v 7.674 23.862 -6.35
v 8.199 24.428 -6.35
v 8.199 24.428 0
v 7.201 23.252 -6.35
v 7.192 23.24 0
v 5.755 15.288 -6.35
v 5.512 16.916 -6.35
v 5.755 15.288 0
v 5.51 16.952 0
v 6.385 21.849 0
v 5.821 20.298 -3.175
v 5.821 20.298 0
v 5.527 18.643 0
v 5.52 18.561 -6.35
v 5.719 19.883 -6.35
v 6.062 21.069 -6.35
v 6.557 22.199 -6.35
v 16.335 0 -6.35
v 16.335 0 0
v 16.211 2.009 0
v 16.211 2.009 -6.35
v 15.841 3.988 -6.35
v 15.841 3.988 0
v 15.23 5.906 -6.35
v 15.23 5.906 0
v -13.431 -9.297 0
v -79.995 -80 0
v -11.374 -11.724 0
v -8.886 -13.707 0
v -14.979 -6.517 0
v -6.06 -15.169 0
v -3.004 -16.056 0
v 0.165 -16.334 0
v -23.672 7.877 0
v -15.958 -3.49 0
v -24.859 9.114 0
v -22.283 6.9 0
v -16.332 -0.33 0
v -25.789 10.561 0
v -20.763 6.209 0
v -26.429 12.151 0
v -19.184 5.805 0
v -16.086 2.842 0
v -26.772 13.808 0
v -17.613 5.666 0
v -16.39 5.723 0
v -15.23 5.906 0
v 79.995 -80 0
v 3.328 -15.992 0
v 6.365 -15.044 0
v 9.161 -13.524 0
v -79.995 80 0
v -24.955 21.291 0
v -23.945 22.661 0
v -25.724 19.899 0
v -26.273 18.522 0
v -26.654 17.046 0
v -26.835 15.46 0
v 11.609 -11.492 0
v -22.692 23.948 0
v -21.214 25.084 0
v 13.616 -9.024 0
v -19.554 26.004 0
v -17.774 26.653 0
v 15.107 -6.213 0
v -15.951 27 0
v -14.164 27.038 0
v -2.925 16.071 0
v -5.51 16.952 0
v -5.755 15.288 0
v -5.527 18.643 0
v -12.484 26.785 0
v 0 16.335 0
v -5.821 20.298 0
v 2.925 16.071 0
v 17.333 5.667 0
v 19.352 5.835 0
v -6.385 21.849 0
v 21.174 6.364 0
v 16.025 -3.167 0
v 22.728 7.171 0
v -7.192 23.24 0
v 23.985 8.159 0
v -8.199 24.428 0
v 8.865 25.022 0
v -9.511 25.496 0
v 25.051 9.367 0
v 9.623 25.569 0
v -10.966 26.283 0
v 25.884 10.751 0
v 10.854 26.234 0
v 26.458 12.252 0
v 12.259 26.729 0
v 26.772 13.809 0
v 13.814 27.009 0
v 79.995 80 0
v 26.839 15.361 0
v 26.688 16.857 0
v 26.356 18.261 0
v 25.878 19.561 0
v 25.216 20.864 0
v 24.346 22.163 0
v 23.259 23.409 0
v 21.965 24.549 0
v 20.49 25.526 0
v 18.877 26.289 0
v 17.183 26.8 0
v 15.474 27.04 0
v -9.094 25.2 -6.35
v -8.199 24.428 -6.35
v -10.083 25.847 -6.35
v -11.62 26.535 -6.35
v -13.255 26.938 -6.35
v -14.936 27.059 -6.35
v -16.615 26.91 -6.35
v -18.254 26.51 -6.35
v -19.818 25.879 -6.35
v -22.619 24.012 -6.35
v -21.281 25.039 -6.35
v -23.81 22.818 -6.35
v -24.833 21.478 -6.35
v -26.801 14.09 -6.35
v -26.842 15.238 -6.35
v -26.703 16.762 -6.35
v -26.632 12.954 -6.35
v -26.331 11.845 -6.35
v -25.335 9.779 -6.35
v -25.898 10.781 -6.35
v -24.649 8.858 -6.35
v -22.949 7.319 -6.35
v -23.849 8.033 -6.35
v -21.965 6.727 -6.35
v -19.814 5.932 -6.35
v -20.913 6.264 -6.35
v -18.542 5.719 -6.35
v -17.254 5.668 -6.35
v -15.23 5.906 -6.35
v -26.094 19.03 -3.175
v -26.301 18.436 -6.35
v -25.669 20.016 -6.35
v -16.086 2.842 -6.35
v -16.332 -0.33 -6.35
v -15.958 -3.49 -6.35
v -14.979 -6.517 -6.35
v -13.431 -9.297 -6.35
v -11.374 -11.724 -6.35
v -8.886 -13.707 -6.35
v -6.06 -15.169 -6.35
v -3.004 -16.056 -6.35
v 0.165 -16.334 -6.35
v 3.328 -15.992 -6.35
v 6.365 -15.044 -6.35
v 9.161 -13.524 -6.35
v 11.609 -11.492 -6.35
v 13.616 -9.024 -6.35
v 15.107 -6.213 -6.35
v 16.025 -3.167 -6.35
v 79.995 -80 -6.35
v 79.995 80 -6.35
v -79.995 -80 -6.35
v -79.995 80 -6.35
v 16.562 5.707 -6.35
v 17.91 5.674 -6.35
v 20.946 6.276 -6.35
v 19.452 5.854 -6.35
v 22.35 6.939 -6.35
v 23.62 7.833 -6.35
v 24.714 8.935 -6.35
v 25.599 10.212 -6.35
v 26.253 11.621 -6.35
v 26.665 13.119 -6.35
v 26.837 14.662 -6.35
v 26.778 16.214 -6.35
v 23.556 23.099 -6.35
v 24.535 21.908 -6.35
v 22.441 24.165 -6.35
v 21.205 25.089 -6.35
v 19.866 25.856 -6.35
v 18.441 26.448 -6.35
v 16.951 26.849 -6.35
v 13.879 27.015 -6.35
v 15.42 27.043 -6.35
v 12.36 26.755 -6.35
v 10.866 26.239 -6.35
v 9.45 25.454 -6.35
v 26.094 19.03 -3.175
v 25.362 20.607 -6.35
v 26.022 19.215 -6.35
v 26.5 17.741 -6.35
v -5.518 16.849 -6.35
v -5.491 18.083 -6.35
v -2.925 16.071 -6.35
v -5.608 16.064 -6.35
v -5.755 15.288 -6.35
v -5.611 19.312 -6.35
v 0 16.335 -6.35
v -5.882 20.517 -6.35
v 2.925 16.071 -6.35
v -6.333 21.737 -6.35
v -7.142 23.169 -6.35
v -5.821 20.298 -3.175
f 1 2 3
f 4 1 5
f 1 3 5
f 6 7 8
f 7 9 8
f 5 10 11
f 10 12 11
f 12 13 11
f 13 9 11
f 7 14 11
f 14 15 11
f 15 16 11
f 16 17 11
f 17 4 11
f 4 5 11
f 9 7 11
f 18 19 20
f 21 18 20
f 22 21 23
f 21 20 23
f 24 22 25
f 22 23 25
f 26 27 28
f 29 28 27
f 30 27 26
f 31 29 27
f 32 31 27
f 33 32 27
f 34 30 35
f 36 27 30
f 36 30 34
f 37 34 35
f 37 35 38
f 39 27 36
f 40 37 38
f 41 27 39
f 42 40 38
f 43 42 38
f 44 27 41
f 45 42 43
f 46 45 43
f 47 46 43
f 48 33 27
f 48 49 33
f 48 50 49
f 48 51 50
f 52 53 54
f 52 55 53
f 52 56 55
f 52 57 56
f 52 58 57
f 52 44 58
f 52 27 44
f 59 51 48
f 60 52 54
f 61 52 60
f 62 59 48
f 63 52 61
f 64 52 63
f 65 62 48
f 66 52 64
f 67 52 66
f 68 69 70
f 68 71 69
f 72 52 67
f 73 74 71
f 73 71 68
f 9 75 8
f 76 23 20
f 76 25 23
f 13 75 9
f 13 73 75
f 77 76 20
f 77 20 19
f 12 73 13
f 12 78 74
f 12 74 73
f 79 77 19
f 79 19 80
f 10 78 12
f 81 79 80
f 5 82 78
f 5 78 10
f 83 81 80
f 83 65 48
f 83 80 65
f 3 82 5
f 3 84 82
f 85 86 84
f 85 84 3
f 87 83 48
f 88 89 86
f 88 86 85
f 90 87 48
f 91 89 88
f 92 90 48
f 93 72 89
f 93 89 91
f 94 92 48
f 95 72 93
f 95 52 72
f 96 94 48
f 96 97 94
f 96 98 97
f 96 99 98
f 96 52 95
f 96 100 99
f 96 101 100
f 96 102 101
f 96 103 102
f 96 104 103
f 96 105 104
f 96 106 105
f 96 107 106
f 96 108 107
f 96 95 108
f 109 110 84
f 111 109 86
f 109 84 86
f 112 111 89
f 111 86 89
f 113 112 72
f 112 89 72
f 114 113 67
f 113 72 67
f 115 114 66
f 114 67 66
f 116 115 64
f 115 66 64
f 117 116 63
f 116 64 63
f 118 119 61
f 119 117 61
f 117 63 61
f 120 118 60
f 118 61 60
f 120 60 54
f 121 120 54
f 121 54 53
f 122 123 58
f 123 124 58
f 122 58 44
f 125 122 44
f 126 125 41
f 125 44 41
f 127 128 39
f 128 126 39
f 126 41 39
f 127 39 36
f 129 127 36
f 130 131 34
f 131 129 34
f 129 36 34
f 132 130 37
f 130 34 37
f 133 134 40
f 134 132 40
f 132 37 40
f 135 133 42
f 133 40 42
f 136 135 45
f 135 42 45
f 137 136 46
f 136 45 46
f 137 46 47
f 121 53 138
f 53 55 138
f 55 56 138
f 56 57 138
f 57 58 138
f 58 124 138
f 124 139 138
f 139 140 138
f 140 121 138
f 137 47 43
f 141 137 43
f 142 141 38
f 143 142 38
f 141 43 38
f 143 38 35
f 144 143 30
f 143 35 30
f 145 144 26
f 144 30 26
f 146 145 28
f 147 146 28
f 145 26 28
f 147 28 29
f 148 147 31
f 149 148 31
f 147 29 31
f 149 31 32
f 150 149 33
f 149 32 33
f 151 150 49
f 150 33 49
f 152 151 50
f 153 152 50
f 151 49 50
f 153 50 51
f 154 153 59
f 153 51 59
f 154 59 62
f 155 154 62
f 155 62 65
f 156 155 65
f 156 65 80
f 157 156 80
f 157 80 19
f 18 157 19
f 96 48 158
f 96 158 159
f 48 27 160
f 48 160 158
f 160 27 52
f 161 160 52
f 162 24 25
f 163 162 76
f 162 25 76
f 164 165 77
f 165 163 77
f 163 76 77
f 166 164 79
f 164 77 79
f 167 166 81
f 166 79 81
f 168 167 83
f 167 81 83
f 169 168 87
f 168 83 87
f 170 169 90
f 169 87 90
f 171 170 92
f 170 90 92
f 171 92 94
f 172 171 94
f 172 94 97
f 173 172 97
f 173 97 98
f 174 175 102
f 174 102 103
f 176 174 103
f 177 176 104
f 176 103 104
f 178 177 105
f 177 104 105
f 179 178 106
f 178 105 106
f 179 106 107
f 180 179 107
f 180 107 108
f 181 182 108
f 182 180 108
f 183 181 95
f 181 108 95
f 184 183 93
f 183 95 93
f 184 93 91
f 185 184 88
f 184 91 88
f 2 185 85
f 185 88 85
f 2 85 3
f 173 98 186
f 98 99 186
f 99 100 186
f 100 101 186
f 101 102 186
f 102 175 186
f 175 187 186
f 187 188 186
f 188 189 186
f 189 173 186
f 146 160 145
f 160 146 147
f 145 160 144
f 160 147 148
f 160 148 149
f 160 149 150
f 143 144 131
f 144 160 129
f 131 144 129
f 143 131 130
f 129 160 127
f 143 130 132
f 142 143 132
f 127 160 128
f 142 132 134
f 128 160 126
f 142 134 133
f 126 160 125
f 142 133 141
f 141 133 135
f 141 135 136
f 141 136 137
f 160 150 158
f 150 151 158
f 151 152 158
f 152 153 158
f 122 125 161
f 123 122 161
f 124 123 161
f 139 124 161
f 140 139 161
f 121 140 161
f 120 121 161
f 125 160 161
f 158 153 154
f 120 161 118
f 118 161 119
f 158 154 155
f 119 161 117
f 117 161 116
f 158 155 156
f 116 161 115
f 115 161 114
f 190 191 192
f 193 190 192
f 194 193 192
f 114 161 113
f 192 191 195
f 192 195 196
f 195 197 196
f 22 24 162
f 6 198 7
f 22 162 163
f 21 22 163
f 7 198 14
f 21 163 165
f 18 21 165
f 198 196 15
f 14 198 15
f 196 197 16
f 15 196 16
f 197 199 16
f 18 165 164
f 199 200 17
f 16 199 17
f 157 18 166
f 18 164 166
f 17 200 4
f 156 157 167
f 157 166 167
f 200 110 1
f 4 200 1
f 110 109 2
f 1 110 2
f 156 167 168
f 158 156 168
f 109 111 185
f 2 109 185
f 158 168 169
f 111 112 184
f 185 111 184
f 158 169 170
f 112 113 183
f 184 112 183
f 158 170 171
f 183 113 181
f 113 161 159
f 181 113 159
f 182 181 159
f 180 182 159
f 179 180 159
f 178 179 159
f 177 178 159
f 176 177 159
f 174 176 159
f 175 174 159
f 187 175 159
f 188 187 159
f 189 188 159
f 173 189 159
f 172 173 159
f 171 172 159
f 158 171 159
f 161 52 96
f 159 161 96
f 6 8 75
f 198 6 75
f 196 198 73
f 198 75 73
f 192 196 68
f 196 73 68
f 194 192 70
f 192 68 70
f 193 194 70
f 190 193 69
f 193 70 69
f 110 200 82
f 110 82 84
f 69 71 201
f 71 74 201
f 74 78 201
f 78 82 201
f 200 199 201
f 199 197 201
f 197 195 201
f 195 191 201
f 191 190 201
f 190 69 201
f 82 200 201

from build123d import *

# Parameters (mm, degrees)
F0_W     = 159.9906936405
F0_H     = 160
F2_DEPTH = 6.35
F3_DEPTH = 6.351
F4_DEPTH = 25
F5_DEPTH = 25
F6_DEPTH = 25
F7_DEPTH = 25


with BuildPart() as f2:
    # F0 (on Top) → F2 (new body)
    with BuildSketch(Plane.XY):
        Rectangle(F0_W, F0_H)
    extrude(amount=-F2_DEPTH)

    # F1 (on face) → F3 (cut, through all)
    with BuildSketch(Plane.XY):
        with BuildLine():
            add(Edge.make_bspline(
                [(-8.1994745377, 24.4279390933), (-19.7248762604, 35.8088584368), (-26.0936386648, 19.0302092428), (-32.4624010693, 2.2515600487), (-15.2297855146, 5.9064251608)],
                knots=[0, 0, 0, 2.0353938469, 2.0353938469, 4.0707876938, 4.0707876938, 4.0707876938], degree=2, weights=[1, 0.5253270315, 1, 0.5253270315, 1]))
            ThreePointArc((-15.2297855146, 5.9064251608), (-11.4929489268, 11.6079433995), (-5.7545107942, 15.2878327607))
            add(Edge.make_bspline(
                [(-5.7545107942, 15.2878327607), (-4.5186333902, 20.7932409522), (-8.1994745377, 24.4279390933)],
                knots=[5.3284067292, 5.3284067292, 5.3284067292, 6.2831853072, 6.2831853072, 6.2831853072], degree=2, weights=[1, 0.8881974706, 1]))
        make_face()
    extrude(amount=-F3_DEPTH, mode=Mode.SUBTRACT)

    # F1 (on face) → F4 (cut)
    with BuildSketch(Plane.XY):
        with BuildLine():
            add(Edge.make_bspline(
                [(5.7545107942, 15.2878327607), (7.4920907008, 7.5475127097), (15.2297855146, 5.9064251608)],
                knots=[0.954778578, 0.954778578, 0.954778578, 2.2123976134, 2.2123976134, 2.2123976134], degree=2, weights=[1, 0.808728302, 1]))
            ThreePointArc((15.2297855146, 5.9064251608), (11.4929489268, 11.6079433995), (5.7545107942, 15.2878327607))
        make_face()
    extrude(amount=-F4_DEPTH, mode=Mode.SUBTRACT)

    # F1 (on face) → F5 (cut)
    with BuildSketch(Plane.XY):
        with BuildLine():
            ThreePointArc((5.7545107942, 15.2878327607), (11.4929489268, 11.6079433995), (15.2297855146, 5.9064251608))
            add(Edge.make_bspline(
                [(15.2297855146, 5.9064251608), (32.4624010693, 2.2515600487), (26.0936386648, 19.0302092428), (19.7248762604, 35.8088584368), (8.1994745377, 24.4279390933)],
                knots=[2.2123976134, 2.2123976134, 2.2123976134, 4.2477914603, 4.2477914603, 6.2831853072, 6.2831853072, 6.2831853072], degree=2, weights=[1, 0.5253270315, 1, 0.5253270315, 1]))
            add(Edge.make_bspline(
                [(8.1994745377, 24.4279390933), (4.5186333902, 20.7932409522), (5.7545107942, 15.2878327607)],
                knots=[0, 0, 0, 0.954778578, 0.954778578, 0.954778578], degree=2, weights=[1, 0.8881974706, 1]))
        make_face()
    extrude(amount=-F5_DEPTH, mode=Mode.SUBTRACT)

    # F1 (on face) → F6 (cut)
    with BuildSketch(Plane.XY):
        with BuildLine():
            ThreePointArc((-5.7545107942, 15.2878327607), (-11.4929489268, 11.6079433995), (-15.2297855146, 5.9064251608))
            add(Edge.make_bspline(
                [(-15.2297855146, 5.9064251608), (-7.4920907008, 7.5475127097), (-5.7545107942, 15.2878327607)],
                knots=[4.0707876938, 4.0707876938, 4.0707876938, 5.3284067292, 5.3284067292, 5.3284067292], degree=2, weights=[1, 0.808728302, 1]))
        make_face()
    extrude(amount=-F6_DEPTH, mode=Mode.SUBTRACT)

    # F1 (on face) → F7 (cut)
    with BuildSketch(Plane.XY):
        with BuildLine():
            ThreePointArc((-15.2297855146, 5.9064251608), (-3.0044698883, -16.0563191825), (16.335, 0))
            ThreePointArc((16.335, 0), (16.0563191825, 3.0044698883), (15.2297855146, 5.9064251608))
            add(Edge.make_bspline(
                [(5.7545107942, 15.2878327607), (7.4920907008, 7.5475127097), (15.2297855146, 5.9064251608)],
                knots=[0.954778578, 0.954778578, 0.954778578, 2.2123976134, 2.2123976134, 2.2123976134], degree=2, weights=[1, 0.808728302, 1]))
            ThreePointArc((5.7545107942, 15.2878327607), (0, 16.335), (-5.7545107942, 15.2878327607))
            add(Edge.make_bspline(
                [(-15.2297855146, 5.9064251608), (-7.4920907008, 7.5475127097), (-5.7545107942, 15.2878327607)],
                knots=[4.0707876938, 4.0707876938, 4.0707876938, 5.3284067292, 5.3284067292, 5.3284067292], degree=2, weights=[1, 0.808728302, 1]))
        make_face()
    extrude(amount=-F7_DEPTH, mode=Mode.SUBTRACT)


solid = f2.part
